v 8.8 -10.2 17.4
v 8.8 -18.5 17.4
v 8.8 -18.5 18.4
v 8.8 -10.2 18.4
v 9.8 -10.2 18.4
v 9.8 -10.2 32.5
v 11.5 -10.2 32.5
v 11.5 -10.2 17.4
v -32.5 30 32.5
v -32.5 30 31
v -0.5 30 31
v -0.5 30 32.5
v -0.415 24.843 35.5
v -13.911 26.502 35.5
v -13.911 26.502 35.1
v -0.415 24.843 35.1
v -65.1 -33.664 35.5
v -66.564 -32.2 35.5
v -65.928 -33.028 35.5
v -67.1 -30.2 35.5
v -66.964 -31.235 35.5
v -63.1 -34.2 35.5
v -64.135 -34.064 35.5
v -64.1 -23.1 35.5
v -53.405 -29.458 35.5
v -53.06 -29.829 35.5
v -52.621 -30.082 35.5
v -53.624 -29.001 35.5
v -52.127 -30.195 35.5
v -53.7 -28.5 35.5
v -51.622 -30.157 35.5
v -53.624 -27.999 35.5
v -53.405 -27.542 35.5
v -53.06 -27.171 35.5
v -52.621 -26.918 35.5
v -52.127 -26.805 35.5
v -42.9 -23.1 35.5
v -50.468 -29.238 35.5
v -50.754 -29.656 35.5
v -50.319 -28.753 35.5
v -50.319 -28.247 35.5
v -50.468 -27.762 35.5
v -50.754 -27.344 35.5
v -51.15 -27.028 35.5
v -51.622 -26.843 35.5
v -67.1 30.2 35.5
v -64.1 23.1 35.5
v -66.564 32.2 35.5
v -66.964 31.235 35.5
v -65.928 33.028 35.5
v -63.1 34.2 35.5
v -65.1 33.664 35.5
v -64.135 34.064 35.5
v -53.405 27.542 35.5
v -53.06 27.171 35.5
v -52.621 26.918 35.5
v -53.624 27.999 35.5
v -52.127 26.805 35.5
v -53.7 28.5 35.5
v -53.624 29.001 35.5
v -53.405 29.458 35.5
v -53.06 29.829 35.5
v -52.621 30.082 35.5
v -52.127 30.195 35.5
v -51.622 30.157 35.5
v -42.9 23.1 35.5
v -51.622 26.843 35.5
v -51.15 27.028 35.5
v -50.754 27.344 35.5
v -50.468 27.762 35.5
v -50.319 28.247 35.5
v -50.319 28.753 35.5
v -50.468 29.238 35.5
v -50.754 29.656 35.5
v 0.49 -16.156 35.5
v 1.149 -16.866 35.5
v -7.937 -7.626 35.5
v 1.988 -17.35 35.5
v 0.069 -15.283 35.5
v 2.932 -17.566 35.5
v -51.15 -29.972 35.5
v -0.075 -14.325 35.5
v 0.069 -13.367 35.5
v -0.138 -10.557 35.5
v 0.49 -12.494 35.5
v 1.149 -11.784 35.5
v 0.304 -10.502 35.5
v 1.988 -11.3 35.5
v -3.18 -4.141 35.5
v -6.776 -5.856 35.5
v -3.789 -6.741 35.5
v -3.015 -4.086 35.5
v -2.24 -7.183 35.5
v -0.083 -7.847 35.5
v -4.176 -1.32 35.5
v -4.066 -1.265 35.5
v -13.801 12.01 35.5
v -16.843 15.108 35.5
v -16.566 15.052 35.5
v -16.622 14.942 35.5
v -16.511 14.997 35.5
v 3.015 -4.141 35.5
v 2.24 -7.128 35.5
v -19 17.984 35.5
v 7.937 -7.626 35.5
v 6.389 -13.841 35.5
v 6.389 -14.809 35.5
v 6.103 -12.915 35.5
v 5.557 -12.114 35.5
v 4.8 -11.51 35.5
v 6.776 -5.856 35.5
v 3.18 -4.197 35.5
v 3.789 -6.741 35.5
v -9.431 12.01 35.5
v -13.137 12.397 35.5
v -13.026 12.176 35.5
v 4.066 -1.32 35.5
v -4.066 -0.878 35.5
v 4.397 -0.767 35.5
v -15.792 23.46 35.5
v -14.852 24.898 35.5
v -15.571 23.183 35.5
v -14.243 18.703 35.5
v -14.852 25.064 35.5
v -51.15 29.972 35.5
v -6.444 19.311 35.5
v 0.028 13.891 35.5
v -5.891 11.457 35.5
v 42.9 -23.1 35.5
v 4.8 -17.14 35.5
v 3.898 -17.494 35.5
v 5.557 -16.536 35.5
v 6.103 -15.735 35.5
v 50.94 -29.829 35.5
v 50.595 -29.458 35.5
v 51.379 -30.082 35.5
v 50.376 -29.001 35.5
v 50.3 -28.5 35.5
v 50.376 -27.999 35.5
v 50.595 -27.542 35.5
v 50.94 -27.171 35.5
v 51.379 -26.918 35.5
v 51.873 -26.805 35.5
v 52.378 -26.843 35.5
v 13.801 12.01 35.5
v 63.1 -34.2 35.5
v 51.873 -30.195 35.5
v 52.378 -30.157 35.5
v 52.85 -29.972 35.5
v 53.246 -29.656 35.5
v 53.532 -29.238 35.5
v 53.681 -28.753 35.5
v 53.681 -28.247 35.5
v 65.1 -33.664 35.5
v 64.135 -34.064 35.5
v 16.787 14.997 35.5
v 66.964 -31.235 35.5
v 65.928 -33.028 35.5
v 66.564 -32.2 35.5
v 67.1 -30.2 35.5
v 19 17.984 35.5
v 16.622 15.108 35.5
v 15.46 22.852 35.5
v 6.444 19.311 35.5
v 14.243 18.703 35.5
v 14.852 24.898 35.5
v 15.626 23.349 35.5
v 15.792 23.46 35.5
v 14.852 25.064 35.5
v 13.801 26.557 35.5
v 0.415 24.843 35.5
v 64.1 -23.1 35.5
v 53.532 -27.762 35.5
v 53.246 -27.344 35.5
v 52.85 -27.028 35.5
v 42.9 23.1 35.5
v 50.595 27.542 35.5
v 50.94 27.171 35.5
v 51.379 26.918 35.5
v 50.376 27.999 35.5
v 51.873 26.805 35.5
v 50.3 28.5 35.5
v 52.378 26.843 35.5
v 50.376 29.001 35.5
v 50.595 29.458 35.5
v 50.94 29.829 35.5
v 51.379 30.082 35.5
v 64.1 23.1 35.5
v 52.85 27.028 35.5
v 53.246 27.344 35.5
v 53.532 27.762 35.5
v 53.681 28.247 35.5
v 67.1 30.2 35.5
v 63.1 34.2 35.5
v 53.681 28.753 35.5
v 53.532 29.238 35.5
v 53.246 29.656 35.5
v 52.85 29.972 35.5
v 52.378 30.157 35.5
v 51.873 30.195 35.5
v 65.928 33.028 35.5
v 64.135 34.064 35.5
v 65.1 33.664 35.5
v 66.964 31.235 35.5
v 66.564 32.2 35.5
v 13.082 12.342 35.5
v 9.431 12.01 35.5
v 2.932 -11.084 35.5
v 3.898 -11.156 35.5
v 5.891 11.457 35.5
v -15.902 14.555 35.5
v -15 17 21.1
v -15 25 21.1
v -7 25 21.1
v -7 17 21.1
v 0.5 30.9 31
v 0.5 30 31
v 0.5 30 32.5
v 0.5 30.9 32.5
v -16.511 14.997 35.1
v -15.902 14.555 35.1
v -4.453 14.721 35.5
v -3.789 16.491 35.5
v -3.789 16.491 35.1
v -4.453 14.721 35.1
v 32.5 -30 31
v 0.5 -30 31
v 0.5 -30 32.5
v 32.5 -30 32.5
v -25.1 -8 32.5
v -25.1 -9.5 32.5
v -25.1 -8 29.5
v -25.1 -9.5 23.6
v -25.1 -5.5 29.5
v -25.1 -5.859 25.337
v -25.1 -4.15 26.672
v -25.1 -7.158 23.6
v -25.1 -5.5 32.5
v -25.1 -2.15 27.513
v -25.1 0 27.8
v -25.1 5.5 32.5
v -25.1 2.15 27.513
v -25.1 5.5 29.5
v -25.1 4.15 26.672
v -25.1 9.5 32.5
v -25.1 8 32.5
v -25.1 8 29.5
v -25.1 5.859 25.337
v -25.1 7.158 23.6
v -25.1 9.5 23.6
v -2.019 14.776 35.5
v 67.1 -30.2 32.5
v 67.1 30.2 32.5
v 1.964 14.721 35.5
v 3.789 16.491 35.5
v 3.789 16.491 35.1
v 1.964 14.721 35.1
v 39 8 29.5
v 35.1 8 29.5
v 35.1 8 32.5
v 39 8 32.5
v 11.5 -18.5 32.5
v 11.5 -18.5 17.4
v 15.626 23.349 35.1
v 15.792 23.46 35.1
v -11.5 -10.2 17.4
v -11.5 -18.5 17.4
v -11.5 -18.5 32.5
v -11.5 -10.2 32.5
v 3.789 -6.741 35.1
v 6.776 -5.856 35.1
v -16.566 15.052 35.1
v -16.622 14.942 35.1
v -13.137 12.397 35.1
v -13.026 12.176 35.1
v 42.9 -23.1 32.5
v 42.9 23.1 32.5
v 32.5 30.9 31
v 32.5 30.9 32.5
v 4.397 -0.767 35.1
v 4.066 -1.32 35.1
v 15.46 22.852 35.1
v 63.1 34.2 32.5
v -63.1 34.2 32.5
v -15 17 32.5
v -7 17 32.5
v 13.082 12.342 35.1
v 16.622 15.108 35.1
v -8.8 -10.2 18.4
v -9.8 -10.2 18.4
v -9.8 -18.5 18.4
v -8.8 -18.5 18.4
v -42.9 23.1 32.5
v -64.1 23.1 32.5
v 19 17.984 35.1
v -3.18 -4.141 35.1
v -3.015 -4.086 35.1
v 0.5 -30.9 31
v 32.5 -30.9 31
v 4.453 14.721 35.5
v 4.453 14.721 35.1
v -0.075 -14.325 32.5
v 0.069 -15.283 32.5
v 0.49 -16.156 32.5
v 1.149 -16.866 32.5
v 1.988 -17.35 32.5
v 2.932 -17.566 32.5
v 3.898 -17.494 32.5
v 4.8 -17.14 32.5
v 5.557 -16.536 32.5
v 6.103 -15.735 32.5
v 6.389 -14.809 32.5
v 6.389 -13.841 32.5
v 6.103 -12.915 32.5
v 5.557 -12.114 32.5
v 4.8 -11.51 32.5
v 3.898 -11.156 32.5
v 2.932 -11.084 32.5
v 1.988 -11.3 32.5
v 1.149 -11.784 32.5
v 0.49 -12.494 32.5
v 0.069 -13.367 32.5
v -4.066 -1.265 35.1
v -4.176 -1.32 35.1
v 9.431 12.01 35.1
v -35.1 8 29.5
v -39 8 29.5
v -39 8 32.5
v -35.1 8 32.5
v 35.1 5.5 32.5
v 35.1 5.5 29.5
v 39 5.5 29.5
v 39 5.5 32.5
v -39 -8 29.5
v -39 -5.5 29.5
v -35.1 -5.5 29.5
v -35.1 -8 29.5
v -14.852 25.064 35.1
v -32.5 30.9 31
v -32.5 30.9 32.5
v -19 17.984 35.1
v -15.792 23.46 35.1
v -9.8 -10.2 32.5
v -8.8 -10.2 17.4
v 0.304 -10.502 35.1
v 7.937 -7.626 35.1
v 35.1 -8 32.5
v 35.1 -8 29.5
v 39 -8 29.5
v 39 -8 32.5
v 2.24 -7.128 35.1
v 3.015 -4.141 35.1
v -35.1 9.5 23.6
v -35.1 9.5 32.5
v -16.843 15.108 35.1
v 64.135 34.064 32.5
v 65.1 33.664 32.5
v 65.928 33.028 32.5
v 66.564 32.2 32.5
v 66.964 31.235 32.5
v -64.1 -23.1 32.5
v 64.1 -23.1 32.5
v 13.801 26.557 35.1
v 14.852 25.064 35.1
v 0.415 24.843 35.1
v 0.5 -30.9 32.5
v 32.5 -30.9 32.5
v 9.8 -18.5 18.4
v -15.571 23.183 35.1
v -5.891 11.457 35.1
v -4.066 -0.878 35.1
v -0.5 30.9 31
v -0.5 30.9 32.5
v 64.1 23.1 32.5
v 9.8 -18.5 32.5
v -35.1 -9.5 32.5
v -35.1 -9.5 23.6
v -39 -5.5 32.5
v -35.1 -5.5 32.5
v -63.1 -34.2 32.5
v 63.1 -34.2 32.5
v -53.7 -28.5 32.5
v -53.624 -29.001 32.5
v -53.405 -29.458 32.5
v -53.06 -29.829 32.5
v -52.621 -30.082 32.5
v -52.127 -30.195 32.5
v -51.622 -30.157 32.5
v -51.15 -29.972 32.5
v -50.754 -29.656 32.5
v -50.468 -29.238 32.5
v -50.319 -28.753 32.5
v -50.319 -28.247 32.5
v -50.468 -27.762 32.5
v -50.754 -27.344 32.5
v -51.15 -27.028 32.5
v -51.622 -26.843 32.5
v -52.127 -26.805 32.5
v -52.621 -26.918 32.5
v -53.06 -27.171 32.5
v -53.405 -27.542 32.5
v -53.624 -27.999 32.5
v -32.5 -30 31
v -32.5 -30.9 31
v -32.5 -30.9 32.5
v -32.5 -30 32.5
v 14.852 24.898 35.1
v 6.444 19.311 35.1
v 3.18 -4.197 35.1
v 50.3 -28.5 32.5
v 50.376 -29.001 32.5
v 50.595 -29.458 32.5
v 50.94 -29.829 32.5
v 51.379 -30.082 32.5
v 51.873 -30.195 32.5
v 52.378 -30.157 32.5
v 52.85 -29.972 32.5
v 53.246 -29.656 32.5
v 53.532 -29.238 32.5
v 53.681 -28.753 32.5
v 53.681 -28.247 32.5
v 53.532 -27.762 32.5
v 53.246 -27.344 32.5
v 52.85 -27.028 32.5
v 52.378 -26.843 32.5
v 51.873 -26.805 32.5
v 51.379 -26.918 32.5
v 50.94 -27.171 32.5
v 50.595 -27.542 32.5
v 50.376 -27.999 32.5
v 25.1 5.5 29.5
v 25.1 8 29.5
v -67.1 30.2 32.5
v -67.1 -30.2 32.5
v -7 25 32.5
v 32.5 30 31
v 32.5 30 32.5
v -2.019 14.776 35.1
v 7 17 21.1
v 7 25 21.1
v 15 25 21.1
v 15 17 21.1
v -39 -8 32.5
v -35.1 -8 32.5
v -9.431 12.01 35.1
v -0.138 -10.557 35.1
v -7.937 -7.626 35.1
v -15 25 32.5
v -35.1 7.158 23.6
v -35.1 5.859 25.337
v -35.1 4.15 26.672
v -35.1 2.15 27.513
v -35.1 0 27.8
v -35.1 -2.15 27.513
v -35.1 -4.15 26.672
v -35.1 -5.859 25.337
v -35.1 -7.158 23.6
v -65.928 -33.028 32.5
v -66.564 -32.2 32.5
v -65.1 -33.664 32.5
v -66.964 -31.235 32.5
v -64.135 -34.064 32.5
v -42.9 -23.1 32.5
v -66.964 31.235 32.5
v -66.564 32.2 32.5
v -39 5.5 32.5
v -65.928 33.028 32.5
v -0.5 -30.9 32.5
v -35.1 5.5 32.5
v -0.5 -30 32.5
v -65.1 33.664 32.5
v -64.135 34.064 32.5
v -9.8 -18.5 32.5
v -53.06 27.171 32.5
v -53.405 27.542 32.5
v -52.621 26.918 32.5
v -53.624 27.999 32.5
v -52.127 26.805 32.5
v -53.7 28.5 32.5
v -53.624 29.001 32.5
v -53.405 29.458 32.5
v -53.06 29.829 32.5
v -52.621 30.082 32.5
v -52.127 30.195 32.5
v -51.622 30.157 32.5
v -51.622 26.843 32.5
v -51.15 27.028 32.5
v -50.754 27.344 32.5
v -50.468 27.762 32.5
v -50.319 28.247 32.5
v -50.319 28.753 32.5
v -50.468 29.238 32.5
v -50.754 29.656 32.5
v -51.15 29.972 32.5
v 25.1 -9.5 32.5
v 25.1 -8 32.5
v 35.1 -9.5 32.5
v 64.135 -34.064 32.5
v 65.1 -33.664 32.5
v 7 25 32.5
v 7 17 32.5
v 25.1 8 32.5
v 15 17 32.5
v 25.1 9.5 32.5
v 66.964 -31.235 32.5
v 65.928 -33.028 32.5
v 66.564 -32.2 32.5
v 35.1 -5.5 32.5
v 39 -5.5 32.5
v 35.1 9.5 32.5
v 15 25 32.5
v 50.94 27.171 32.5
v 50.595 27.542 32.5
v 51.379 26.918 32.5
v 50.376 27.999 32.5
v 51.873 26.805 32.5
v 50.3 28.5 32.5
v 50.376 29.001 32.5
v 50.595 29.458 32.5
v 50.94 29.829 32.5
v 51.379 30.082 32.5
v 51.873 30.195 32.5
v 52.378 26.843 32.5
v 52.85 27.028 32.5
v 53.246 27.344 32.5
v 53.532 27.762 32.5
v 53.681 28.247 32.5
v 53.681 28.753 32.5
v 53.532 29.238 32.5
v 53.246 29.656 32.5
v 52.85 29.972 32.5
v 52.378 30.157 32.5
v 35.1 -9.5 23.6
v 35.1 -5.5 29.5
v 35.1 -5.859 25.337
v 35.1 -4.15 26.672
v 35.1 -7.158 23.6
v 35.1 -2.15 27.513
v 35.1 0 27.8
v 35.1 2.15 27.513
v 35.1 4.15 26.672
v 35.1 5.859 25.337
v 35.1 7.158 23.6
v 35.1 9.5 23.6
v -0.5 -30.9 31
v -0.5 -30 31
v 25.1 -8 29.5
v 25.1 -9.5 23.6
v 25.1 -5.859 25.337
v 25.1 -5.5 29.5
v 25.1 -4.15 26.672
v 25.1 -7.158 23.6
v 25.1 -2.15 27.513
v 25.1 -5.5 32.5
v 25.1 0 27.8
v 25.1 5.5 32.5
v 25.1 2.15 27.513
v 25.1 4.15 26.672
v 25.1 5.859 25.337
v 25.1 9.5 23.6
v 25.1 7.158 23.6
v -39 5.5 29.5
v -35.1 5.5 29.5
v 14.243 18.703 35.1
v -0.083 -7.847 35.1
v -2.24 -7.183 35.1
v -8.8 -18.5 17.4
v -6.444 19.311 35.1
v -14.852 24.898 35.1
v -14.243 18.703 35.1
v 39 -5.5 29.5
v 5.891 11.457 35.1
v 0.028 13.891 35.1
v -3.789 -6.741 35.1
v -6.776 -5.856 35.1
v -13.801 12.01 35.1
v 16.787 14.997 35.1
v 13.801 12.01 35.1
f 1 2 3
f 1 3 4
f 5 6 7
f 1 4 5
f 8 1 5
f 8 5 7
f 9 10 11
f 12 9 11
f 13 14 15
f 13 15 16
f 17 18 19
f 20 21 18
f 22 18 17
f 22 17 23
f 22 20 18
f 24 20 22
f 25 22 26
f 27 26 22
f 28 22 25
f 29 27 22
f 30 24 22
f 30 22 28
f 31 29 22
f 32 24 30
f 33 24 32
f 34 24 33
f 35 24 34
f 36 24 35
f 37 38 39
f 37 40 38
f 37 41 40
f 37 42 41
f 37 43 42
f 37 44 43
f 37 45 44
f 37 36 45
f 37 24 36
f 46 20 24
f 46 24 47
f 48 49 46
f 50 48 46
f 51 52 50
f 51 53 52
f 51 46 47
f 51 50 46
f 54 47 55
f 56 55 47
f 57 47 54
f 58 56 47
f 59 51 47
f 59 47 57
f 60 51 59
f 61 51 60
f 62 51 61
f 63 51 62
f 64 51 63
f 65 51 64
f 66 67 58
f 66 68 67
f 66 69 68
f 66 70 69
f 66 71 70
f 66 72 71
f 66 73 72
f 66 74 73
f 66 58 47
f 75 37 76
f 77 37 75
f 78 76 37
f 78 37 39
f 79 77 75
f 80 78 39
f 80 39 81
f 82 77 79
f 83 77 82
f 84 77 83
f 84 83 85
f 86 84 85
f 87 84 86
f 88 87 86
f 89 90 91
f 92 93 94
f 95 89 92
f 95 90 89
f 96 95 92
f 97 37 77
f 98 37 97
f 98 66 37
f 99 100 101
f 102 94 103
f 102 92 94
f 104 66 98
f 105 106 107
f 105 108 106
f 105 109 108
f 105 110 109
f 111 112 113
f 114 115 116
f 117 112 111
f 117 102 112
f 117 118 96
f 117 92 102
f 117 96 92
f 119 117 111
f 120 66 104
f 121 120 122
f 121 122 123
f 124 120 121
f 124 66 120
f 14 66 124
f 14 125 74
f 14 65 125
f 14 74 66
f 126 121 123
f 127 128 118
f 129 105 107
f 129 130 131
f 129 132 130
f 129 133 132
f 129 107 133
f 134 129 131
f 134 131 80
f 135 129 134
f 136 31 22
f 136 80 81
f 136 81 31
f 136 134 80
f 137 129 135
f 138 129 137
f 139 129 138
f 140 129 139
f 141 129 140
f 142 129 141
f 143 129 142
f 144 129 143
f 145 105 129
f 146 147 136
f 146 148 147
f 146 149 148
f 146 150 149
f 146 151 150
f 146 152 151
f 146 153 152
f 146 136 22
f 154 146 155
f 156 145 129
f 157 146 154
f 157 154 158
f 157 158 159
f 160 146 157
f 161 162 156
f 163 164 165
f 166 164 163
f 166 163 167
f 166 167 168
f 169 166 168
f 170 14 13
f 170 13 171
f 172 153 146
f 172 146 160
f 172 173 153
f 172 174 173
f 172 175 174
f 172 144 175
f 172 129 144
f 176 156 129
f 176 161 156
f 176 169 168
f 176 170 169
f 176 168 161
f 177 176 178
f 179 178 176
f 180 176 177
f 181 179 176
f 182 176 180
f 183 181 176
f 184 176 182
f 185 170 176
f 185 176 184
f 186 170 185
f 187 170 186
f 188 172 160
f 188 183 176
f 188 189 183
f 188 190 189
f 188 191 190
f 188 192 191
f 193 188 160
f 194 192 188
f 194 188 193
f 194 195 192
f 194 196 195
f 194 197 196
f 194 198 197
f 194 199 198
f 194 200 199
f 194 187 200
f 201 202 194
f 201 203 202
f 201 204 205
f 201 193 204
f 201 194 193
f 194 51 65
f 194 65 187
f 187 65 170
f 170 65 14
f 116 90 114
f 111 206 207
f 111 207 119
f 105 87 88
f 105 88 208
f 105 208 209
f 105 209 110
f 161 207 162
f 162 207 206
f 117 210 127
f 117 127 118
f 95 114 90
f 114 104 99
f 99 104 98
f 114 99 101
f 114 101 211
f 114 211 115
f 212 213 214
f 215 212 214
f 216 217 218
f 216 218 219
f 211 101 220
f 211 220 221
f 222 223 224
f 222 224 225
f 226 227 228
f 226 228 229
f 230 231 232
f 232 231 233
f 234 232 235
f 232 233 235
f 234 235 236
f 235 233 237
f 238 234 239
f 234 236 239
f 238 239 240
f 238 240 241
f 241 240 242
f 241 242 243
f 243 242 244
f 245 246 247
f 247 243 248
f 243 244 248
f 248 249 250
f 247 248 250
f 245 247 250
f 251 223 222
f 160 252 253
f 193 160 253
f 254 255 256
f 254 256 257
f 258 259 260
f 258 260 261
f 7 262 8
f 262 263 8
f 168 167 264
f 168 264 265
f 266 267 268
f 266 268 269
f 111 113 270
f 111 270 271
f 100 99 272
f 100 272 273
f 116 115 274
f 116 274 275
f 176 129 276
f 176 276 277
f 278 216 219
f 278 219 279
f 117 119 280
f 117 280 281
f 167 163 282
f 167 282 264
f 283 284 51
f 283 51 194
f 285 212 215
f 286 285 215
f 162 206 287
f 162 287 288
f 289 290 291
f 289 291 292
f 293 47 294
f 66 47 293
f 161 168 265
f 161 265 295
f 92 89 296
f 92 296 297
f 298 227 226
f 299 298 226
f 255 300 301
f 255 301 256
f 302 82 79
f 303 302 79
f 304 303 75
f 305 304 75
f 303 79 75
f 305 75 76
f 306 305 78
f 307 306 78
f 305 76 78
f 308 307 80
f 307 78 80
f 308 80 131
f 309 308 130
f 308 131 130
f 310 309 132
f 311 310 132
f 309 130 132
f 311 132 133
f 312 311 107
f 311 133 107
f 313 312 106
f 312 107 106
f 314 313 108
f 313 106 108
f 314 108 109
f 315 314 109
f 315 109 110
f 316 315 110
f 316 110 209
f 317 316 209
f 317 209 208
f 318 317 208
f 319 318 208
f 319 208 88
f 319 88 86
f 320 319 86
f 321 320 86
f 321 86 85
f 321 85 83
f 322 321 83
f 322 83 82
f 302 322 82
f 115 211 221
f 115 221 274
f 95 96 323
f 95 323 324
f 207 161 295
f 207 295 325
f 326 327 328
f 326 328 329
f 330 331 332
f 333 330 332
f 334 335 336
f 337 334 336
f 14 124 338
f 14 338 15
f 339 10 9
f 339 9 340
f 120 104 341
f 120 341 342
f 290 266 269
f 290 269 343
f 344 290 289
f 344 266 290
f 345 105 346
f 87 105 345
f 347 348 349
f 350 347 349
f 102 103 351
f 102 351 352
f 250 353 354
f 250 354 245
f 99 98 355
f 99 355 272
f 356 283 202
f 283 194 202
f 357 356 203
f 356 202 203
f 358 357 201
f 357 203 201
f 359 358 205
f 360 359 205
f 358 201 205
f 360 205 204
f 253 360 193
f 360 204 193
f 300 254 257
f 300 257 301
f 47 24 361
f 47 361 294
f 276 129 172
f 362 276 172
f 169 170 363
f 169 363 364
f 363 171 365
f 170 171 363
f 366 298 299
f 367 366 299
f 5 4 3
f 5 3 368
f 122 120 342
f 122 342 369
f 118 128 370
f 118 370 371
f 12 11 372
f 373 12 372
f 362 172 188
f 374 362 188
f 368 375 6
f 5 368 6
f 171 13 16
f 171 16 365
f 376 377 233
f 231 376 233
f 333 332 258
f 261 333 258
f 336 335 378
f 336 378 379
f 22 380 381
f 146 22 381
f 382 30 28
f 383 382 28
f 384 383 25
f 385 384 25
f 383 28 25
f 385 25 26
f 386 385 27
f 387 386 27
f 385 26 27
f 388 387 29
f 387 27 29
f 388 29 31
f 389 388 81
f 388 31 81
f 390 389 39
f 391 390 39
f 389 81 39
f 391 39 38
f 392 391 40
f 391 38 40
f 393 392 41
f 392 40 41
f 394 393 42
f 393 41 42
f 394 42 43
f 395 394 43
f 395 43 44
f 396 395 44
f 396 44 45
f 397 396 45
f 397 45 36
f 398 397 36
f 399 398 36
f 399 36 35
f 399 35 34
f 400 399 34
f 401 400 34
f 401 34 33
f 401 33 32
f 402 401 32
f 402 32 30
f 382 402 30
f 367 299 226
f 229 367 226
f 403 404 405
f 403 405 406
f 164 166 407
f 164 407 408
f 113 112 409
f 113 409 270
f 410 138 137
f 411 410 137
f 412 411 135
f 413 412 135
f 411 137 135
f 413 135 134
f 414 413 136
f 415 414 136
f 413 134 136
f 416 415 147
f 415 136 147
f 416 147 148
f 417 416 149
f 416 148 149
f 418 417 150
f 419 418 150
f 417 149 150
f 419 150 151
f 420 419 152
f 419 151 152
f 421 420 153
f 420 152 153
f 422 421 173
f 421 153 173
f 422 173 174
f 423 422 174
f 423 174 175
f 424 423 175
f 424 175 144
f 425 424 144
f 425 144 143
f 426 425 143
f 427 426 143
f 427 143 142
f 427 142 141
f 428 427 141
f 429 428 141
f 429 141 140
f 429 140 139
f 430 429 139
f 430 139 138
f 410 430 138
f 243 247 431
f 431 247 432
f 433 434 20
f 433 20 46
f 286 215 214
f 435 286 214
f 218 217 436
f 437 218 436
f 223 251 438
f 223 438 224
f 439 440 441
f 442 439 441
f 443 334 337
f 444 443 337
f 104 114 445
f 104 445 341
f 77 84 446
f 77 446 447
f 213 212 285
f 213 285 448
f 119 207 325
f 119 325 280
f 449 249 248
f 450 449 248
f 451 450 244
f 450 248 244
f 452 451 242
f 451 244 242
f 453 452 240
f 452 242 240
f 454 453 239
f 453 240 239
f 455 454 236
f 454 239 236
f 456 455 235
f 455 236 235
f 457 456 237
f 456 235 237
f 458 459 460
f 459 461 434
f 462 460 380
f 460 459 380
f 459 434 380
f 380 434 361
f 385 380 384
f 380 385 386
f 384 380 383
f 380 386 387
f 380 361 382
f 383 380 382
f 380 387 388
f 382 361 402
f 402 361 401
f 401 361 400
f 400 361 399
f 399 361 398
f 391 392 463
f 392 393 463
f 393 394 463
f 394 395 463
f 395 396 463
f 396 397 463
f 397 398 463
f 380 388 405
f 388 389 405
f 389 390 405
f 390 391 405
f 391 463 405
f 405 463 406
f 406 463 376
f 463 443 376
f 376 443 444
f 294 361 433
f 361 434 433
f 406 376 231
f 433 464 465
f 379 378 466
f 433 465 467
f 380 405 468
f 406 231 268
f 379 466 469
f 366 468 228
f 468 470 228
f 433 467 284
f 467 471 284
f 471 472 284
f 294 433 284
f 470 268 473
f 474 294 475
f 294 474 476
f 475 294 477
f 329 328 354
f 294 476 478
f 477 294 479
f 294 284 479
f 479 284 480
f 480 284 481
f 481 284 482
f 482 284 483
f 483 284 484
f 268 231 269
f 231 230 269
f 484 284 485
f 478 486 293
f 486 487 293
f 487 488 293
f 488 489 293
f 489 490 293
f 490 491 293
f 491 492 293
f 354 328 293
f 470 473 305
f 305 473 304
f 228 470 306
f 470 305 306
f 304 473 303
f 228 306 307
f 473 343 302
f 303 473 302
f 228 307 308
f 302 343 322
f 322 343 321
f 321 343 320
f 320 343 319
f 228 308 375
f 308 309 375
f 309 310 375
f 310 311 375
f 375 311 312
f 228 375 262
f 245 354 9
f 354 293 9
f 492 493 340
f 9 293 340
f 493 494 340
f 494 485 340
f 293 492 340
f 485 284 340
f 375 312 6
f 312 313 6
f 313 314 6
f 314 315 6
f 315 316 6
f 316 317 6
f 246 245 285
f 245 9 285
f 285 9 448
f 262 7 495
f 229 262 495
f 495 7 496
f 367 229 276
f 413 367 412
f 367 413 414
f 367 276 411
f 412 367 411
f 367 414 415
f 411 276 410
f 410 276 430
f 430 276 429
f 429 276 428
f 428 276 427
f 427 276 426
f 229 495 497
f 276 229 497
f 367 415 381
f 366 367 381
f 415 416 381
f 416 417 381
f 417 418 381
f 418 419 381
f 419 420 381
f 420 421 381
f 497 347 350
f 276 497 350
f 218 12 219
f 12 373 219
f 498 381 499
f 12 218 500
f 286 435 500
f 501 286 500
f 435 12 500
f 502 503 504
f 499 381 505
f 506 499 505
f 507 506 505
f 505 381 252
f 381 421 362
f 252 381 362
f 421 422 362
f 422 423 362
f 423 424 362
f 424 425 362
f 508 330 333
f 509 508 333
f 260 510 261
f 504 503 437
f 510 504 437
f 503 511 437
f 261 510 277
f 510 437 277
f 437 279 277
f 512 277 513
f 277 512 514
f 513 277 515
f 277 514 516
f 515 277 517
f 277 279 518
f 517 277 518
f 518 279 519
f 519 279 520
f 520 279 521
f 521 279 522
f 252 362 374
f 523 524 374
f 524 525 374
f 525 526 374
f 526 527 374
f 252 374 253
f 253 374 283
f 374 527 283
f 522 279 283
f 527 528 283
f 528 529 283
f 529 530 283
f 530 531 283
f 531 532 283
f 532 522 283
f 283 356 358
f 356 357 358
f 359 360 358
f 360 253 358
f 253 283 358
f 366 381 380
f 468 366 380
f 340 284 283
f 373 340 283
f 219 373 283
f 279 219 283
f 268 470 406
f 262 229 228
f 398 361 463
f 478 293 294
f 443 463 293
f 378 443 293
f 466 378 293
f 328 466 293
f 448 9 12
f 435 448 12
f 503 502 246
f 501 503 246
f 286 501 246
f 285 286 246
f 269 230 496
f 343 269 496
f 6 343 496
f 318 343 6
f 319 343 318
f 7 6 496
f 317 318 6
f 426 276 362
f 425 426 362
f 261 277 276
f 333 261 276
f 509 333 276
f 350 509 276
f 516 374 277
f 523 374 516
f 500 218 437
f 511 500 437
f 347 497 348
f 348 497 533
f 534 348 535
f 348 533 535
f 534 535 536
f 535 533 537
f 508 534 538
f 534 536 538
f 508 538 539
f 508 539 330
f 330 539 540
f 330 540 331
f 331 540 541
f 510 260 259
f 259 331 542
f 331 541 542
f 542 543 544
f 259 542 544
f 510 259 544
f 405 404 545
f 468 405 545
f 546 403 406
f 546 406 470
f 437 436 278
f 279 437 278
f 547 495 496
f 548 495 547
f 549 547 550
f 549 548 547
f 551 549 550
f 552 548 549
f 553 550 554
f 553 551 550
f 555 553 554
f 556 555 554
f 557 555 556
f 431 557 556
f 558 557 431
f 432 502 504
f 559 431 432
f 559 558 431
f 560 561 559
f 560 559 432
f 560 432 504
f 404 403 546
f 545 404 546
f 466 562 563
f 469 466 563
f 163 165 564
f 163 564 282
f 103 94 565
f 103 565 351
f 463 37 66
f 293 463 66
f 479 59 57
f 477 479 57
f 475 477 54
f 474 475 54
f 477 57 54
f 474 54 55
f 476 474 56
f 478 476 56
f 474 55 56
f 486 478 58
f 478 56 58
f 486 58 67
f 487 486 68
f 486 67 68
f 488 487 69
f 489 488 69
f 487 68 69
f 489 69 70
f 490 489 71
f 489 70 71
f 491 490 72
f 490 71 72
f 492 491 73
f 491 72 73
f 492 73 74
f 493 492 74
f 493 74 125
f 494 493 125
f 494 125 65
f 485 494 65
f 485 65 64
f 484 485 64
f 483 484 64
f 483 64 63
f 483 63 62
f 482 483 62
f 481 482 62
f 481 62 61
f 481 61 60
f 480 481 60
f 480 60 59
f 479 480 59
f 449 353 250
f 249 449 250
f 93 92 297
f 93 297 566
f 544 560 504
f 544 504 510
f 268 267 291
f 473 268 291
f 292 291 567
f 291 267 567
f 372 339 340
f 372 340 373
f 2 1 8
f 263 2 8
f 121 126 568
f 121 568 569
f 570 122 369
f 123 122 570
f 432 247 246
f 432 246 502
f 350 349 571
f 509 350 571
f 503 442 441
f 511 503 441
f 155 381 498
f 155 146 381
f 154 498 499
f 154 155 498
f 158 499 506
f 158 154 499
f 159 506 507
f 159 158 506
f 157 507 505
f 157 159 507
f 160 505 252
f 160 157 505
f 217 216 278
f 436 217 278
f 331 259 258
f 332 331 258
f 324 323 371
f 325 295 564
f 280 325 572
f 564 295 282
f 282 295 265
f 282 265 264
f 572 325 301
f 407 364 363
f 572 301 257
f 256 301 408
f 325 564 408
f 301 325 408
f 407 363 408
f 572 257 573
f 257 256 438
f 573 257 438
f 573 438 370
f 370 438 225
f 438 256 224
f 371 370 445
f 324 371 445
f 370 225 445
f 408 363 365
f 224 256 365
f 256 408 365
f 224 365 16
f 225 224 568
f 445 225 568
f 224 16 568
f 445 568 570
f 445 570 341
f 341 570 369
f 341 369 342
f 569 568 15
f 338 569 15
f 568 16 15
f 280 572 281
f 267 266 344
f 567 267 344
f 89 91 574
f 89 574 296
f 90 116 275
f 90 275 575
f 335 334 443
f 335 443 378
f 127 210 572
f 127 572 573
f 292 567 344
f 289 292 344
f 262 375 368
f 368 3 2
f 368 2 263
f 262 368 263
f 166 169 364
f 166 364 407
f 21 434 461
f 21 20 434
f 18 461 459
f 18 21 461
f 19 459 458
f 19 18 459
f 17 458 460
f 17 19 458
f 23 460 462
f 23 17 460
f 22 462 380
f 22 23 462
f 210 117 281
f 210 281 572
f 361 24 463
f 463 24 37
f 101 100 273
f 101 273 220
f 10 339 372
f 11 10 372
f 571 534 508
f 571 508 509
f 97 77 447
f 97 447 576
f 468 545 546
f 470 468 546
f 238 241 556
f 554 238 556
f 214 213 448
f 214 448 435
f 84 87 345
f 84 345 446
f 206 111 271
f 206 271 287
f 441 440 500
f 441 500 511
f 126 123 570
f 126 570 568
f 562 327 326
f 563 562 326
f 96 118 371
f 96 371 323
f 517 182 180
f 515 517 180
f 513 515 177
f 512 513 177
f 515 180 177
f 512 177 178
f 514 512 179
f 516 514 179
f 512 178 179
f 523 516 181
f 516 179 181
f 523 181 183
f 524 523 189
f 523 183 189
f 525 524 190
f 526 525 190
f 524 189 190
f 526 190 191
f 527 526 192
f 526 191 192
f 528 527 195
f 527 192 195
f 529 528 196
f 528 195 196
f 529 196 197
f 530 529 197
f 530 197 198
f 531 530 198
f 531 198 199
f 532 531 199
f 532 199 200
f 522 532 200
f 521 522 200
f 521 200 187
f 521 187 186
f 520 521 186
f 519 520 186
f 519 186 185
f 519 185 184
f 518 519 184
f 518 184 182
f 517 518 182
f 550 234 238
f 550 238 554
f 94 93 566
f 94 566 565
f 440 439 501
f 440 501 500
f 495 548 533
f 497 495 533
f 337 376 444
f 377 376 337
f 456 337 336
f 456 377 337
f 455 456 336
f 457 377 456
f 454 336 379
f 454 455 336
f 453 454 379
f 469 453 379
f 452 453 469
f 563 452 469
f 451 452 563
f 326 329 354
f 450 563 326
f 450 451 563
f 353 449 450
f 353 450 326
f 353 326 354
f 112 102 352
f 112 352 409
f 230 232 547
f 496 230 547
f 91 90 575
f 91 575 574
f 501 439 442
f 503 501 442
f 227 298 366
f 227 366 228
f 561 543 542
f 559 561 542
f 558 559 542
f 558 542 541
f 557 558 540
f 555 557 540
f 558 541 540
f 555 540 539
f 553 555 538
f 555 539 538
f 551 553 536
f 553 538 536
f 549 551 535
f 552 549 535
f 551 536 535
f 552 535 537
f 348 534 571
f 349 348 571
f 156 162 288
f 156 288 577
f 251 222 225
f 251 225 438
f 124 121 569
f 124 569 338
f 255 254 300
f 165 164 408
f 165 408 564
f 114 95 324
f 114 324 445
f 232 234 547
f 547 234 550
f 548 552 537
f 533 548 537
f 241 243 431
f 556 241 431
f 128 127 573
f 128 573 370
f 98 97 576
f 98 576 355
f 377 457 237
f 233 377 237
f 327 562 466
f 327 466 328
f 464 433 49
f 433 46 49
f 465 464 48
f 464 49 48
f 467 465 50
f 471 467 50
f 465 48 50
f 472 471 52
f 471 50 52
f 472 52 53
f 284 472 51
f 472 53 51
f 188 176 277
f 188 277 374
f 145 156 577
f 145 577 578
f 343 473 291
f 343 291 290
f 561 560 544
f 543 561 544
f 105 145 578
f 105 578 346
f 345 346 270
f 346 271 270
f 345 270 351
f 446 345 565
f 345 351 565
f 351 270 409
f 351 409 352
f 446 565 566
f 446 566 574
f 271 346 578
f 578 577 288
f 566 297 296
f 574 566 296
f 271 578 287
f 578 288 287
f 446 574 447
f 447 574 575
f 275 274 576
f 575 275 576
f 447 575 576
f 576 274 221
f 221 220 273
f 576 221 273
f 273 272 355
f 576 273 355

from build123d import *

# Parameters (mm, degrees)
LID_PLATE_START                    = 32.5
LID_FOOTPRINT_W                    = 134.2
LID_FOOTPRINT_H                    = 68.4
LID_PLATE_DEPTH                    = 3
WHEEL_CLEARANCE_WINDOWS_START      = 36
WHEEL_WELL_PROFILE_W               = 21.2
WHEEL_WELL_PROFILE_H               = 46.2
WHEEL_CLEARANCE_WINDOWS_DEPTH      = 5
LID_STIFFENING_RIBS_START          = 29.5
LID_RIB_PROFILE_W                  = 78
LID_RIB_PROFILE_H                  = 2.5
LID_STIFFENING_RIBS_DEPTH          = 3
LID_MOTOR_CLAMP_BLOCKS_START       = 23.6
UPPER_MOTOR_CLAMP_PROFILE_W        = 10
UPPER_MOTOR_CLAMP_PROFILE_H        = 19
LID_MOTOR_CLAMP_BLOCKS_DEPTH       = 8.9
UPPER_MOTOR_CLAMP_SEATS_R8P2_START = 36
UPPER_CLAMP_RADIUS_PROFILE_R       = 8.2
UPPER_MOTOR_CLAMP_SEATS_R8P2_DEPTH = 72
REGISTRATION_TABS_START            = 31
LID_REGISTRATION_PROFILE_W         = 32
LID_REGISTRATION_PROFILE_H         = 0.9
REGISTRATION_TABS_DEPTH            = 1.5
BATTERY_SOFT_PAD_STOPS_START       = 21.1
BATTERY_UPPER_STOP_PROFILE_W       = 8
BATTERY_UPPER_STOP_PROFILE_H       = 8
BATTERY_SOFT_PAD_STOPS_DEPTH       = 11.4
LID_M3_CLEARANCE_HOLES_START       = 36
LID_M3_CLEARANCE_PROFILE_R         = 1.7
LID_M3_CLEARANCE_HOLES_DEPTH       = 5
SWITCH_RETENTION_RAILS_START       = 18.4
SWITCH_RETENTION_RAIL_PROFILE_W    = 1.7
SWITCH_RETENTION_RAIL_PROFILE_H    = 8.3
SWITCH_RETENTION_RAILS_DEPTH       = 14.1
SWITCH_RETENTION_LEDGES_START      = 17.4
SWITCH_RETENTION_LEDGE_PROFILE_W   = 2.7
SWITCH_RETENTION_LEDGE_PROFILE_H   = 8.3
SWITCH_RETENTION_LEDGES_DEPTH      = 1
SWITCH_TOOL_ACCESS_START           = 36
SWITCH_TOOL_ACCESS_PROFILE_R       = 3.25
SWITCH_TOOL_ACCESS_DEPTH           = 5
LID_OUTER_CORNERS_R4_R             = 4
SNAKE_LOGO_ENGRAVED_START          = 35.5
SNAKE_LOGO_ENGRAVED_DEPTH          = 0.4


with BuildPart() as part:
    # Lid_Footprint → Lid_Plate (new body)
    with BuildSketch(Plane.XY.offset(LID_PLATE_START)):
        Rectangle(LID_FOOTPRINT_W, LID_FOOTPRINT_H)
    extrude(amount=LID_PLATE_DEPTH)

    # Wheel_Well_Profile → Wheel_Clearance_Windows (cut)
    with BuildSketch(Plane.XY.offset(WHEEL_CLEARANCE_WINDOWS_START)):
        with Locations((53.5, 0)):
            Rectangle(WHEEL_WELL_PROFILE_W, WHEEL_WELL_PROFILE_H)
        with Locations((-53.5, 0)):
            Rectangle(WHEEL_WELL_PROFILE_W, WHEEL_WELL_PROFILE_H)
    extrude(amount=-WHEEL_CLEARANCE_WINDOWS_DEPTH, mode=Mode.SUBTRACT)

    # Lid_Rib_Profile → Lid_Stiffening_Ribs (add)
    with BuildSketch(Plane.XY.offset(LID_STIFFENING_RIBS_START)):
        with Locations((0, -6.75)):
            Rectangle(LID_RIB_PROFILE_W, LID_RIB_PROFILE_H)
        with Locations((0, 6.75)):
            Rectangle(LID_RIB_PROFILE_W, LID_RIB_PROFILE_H)
    extrude(amount=LID_STIFFENING_RIBS_DEPTH)

    # Upper_Motor_Clamp_Profile → Lid_Motor_Clamp_Blocks (add)
    with BuildSketch(Plane.XY.offset(LID_MOTOR_CLAMP_BLOCKS_START)):
        with Locations((-30.1, 0)):
            Rectangle(UPPER_MOTOR_CLAMP_PROFILE_W, UPPER_MOTOR_CLAMP_PROFILE_H)
        with Locations((30.1, 0)):
            Rectangle(UPPER_MOTOR_CLAMP_PROFILE_W, UPPER_MOTOR_CLAMP_PROFILE_H)
    extrude(amount=LID_MOTOR_CLAMP_BLOCKS_DEPTH)

    # Upper_Clamp_Radius_Profile → Upper_Motor_Clamp_Seats_R8p2 (cut)
    with BuildSketch(Plane(origin=(0, 0, 0), x_dir=(0, 0, -1), z_dir=(1, 0, 0)).offset(UPPER_MOTOR_CLAMP_SEATS_R8P2_START)):
        with Locations((-19.6, 0)):
            Circle(UPPER_CLAMP_RADIUS_PROFILE_R)
    extrude(amount=-UPPER_MOTOR_CLAMP_SEATS_R8P2_DEPTH, mode=Mode.SUBTRACT)

    # Lid_Registration_Profile → Registration_Tabs (add)
    with BuildSketch(Plane.XY.offset(REGISTRATION_TABS_START)):
        with Locations((-16.5, 30.45)):
            Rectangle(LID_REGISTRATION_PROFILE_W, LID_REGISTRATION_PROFILE_H)
        with Locations((16.5, 30.45)):
            Rectangle(LID_REGISTRATION_PROFILE_W, LID_REGISTRATION_PROFILE_H)
        with Locations((-16.5, -30.45)):
            Rectangle(LID_REGISTRATION_PROFILE_W, LID_REGISTRATION_PROFILE_H)
        with Locations((16.5, -30.45)):
            Rectangle(LID_REGISTRATION_PROFILE_W, LID_REGISTRATION_PROFILE_H)
    extrude(amount=REGISTRATION_TABS_DEPTH)

    # Battery_Upper_Stop_Profile → Battery_Soft_Pad_Stops (add)
    with BuildSketch(Plane.XY.offset(BATTERY_SOFT_PAD_STOPS_START)):
        with Locations((-11, 21)):
            Rectangle(BATTERY_UPPER_STOP_PROFILE_W, BATTERY_UPPER_STOP_PROFILE_H)
        with Locations((11, 21)):
            Rectangle(BATTERY_UPPER_STOP_PROFILE_W, BATTERY_UPPER_STOP_PROFILE_H)
    extrude(amount=BATTERY_SOFT_PAD_STOPS_DEPTH)

    # Lid_M3_Clearance_Profile → Lid_M3_Clearance_Holes (cut)
    with BuildSketch(Plane.XY.offset(LID_M3_CLEARANCE_HOLES_START)):
        with Locations(Location((-52, -28.5, 0), (0, 0, 180))):
            Circle(LID_M3_CLEARANCE_PROFILE_R)
        with Locations(Location((-52, 28.5, 0), (0, 0, 180))):
            Circle(LID_M3_CLEARANCE_PROFILE_R)
        with Locations(Location((52, -28.5, 0), (0, 0, 180))):
            Circle(LID_M3_CLEARANCE_PROFILE_R)
        with Locations(Location((52, 28.5, 0), (0, 0, 180))):
            Circle(LID_M3_CLEARANCE_PROFILE_R)
    extrude(amount=-LID_M3_CLEARANCE_HOLES_DEPTH, mode=Mode.SUBTRACT)

    # Switch_Retention_Rail_Profile → Switch_Retention_Rails (add)
    with BuildSketch(Plane.XY.offset(SWITCH_RETENTION_RAILS_START)):
        with Locations((-10.65, -14.35)):
            Rectangle(SWITCH_RETENTION_RAIL_PROFILE_W, SWITCH_RETENTION_RAIL_PROFILE_H)
        with Locations((10.65, -14.35)):
            Rectangle(SWITCH_RETENTION_RAIL_PROFILE_W, SWITCH_RETENTION_RAIL_PROFILE_H)
    extrude(amount=SWITCH_RETENTION_RAILS_DEPTH)

    # Switch_Retention_Ledge_Profile → Switch_Retention_Ledges (add)
    with BuildSketch(Plane.XY.offset(SWITCH_RETENTION_LEDGES_START)):
        with Locations((-10.15, -14.35)):
            Rectangle(SWITCH_RETENTION_LEDGE_PROFILE_W, SWITCH_RETENTION_LEDGE_PROFILE_H)
        with Locations((10.15, -14.35)):
            Rectangle(SWITCH_RETENTION_LEDGE_PROFILE_W, SWITCH_RETENTION_LEDGE_PROFILE_H)
    extrude(amount=SWITCH_RETENTION_LEDGES_DEPTH)

    # Switch_Tool_Access_Profile → Switch_Tool_Access (cut)
    with BuildSketch(Plane.XY.offset(SWITCH_TOOL_ACCESS_START)):
        with Locations(Location((3.175, -14.325, 0), (0, 0, 180))):
            Circle(SWITCH_TOOL_ACCESS_PROFILE_R)
    extrude(amount=-SWITCH_TOOL_ACCESS_DEPTH, mode=Mode.SUBTRACT)

    # Lid_Outer_Corners_R4
    lid_outer_corners_r4_edges = [part.edges().sort_by_distance(p)[0] for p in [
        (-67.1, 34.2, 34),
        (67.1, 34.2, 34),
        (67.1, -34.2, 34),
        (-67.1, -34.2, 34),
    ]]
    fillet(lid_outer_corners_r4_edges, radius=LID_OUTER_CORNERS_R4_R)

    # Snake_Logo_Native_Profile → Snake_Logo_Engraved (cut)
    # profile 1 of 2: a face of its own
    with BuildSketch(Plane.XY.offset(SNAKE_LOGO_ENGRAVED_START)):
        Polygon((13.800582242, 26.557496361), (14.851528384, 25.064046579), (14.851528384, 24.898107715), (6.443959243, 19.311499272), (14.243085881, 18.703056769), (15.459970888, 22.851528384), (15.625909753, 23.349344978), (15.791848617, 23.459970888), (19, 17.983988355), (9.430858806, 12.010189229), (4.397379913, -0.767103348), (4.065502183, -1.320232897), (5.890829694, 11.45705968), (0.027656477, 13.890829694), (-5.890829694, 11.45705968), (-4.065502183, -0.877729258), (-4.065502183, -1.264919942), (-4.176128093, -1.320232897), (-9.430858806, 12.010189229), (-19, 17.983988355), (-15.791848617, 23.459970888), (-15.570596798, 23.183406114), (-14.243085881, 18.703056769), (-6.443959243, 19.311499272), (-14.851528384, 24.898107715), (-14.851528384, 25.064046579), (-13.911208151, 26.502183406), (-0.414847162, 24.84279476), (0.414847162, 24.84279476), align=None)
        Polygon((-4.452692868, 14.720524017), (-2.018922853, 14.775836972), (-3.788937409, 16.490538574), align=None, mode=Mode.SUBTRACT)
        Polygon((1.963609898, 14.720524017), (4.452692868, 14.720524017), (3.788937409, 16.490538574), align=None, mode=Mode.SUBTRACT)
    # profile 2 of 2: a face of its own
    with BuildSketch(Plane.XY.offset(SNAKE_LOGO_ENGRAVED_START)):
        Polygon((-16.84279476, 15.107714702), (-16.566229985, 15.052401747), (-16.62154294, 14.941775837), (-16.510917031, 14.997088792), (-15.902474527, 14.554585153), (-13.136826783, 12.397379913), (-13.026200873, 12.176128093), (-6.775836972, -5.855895197), (-3.788937409, -6.740902475), (-3.180494905, -4.141193595), (-3.014556041, -4.08588064), (-2.240174672, -7.183406114), (-0.082969432, -7.847161572), (2.240174672, -7.128093159), (3.014556041, -4.141193595), (3.180494905, -4.19650655), (3.788937409, -6.740902475), (6.775836972, -5.855895197), (13.081513828, 12.342066958), (16.62154294, 15.107714702), (16.787481805, 14.997088792), (13.800582242, 12.010189229), (7.937409025, -7.625909753), (0.304221252, -10.502183406), (-0.138282387, -10.557496361), (-7.937409025, -7.625909753), (-13.800582242, 12.010189229), align=None)
    extrude(amount=-SNAKE_LOGO_ENGRAVED_DEPTH, mode=Mode.SUBTRACT)


solid = part.part
